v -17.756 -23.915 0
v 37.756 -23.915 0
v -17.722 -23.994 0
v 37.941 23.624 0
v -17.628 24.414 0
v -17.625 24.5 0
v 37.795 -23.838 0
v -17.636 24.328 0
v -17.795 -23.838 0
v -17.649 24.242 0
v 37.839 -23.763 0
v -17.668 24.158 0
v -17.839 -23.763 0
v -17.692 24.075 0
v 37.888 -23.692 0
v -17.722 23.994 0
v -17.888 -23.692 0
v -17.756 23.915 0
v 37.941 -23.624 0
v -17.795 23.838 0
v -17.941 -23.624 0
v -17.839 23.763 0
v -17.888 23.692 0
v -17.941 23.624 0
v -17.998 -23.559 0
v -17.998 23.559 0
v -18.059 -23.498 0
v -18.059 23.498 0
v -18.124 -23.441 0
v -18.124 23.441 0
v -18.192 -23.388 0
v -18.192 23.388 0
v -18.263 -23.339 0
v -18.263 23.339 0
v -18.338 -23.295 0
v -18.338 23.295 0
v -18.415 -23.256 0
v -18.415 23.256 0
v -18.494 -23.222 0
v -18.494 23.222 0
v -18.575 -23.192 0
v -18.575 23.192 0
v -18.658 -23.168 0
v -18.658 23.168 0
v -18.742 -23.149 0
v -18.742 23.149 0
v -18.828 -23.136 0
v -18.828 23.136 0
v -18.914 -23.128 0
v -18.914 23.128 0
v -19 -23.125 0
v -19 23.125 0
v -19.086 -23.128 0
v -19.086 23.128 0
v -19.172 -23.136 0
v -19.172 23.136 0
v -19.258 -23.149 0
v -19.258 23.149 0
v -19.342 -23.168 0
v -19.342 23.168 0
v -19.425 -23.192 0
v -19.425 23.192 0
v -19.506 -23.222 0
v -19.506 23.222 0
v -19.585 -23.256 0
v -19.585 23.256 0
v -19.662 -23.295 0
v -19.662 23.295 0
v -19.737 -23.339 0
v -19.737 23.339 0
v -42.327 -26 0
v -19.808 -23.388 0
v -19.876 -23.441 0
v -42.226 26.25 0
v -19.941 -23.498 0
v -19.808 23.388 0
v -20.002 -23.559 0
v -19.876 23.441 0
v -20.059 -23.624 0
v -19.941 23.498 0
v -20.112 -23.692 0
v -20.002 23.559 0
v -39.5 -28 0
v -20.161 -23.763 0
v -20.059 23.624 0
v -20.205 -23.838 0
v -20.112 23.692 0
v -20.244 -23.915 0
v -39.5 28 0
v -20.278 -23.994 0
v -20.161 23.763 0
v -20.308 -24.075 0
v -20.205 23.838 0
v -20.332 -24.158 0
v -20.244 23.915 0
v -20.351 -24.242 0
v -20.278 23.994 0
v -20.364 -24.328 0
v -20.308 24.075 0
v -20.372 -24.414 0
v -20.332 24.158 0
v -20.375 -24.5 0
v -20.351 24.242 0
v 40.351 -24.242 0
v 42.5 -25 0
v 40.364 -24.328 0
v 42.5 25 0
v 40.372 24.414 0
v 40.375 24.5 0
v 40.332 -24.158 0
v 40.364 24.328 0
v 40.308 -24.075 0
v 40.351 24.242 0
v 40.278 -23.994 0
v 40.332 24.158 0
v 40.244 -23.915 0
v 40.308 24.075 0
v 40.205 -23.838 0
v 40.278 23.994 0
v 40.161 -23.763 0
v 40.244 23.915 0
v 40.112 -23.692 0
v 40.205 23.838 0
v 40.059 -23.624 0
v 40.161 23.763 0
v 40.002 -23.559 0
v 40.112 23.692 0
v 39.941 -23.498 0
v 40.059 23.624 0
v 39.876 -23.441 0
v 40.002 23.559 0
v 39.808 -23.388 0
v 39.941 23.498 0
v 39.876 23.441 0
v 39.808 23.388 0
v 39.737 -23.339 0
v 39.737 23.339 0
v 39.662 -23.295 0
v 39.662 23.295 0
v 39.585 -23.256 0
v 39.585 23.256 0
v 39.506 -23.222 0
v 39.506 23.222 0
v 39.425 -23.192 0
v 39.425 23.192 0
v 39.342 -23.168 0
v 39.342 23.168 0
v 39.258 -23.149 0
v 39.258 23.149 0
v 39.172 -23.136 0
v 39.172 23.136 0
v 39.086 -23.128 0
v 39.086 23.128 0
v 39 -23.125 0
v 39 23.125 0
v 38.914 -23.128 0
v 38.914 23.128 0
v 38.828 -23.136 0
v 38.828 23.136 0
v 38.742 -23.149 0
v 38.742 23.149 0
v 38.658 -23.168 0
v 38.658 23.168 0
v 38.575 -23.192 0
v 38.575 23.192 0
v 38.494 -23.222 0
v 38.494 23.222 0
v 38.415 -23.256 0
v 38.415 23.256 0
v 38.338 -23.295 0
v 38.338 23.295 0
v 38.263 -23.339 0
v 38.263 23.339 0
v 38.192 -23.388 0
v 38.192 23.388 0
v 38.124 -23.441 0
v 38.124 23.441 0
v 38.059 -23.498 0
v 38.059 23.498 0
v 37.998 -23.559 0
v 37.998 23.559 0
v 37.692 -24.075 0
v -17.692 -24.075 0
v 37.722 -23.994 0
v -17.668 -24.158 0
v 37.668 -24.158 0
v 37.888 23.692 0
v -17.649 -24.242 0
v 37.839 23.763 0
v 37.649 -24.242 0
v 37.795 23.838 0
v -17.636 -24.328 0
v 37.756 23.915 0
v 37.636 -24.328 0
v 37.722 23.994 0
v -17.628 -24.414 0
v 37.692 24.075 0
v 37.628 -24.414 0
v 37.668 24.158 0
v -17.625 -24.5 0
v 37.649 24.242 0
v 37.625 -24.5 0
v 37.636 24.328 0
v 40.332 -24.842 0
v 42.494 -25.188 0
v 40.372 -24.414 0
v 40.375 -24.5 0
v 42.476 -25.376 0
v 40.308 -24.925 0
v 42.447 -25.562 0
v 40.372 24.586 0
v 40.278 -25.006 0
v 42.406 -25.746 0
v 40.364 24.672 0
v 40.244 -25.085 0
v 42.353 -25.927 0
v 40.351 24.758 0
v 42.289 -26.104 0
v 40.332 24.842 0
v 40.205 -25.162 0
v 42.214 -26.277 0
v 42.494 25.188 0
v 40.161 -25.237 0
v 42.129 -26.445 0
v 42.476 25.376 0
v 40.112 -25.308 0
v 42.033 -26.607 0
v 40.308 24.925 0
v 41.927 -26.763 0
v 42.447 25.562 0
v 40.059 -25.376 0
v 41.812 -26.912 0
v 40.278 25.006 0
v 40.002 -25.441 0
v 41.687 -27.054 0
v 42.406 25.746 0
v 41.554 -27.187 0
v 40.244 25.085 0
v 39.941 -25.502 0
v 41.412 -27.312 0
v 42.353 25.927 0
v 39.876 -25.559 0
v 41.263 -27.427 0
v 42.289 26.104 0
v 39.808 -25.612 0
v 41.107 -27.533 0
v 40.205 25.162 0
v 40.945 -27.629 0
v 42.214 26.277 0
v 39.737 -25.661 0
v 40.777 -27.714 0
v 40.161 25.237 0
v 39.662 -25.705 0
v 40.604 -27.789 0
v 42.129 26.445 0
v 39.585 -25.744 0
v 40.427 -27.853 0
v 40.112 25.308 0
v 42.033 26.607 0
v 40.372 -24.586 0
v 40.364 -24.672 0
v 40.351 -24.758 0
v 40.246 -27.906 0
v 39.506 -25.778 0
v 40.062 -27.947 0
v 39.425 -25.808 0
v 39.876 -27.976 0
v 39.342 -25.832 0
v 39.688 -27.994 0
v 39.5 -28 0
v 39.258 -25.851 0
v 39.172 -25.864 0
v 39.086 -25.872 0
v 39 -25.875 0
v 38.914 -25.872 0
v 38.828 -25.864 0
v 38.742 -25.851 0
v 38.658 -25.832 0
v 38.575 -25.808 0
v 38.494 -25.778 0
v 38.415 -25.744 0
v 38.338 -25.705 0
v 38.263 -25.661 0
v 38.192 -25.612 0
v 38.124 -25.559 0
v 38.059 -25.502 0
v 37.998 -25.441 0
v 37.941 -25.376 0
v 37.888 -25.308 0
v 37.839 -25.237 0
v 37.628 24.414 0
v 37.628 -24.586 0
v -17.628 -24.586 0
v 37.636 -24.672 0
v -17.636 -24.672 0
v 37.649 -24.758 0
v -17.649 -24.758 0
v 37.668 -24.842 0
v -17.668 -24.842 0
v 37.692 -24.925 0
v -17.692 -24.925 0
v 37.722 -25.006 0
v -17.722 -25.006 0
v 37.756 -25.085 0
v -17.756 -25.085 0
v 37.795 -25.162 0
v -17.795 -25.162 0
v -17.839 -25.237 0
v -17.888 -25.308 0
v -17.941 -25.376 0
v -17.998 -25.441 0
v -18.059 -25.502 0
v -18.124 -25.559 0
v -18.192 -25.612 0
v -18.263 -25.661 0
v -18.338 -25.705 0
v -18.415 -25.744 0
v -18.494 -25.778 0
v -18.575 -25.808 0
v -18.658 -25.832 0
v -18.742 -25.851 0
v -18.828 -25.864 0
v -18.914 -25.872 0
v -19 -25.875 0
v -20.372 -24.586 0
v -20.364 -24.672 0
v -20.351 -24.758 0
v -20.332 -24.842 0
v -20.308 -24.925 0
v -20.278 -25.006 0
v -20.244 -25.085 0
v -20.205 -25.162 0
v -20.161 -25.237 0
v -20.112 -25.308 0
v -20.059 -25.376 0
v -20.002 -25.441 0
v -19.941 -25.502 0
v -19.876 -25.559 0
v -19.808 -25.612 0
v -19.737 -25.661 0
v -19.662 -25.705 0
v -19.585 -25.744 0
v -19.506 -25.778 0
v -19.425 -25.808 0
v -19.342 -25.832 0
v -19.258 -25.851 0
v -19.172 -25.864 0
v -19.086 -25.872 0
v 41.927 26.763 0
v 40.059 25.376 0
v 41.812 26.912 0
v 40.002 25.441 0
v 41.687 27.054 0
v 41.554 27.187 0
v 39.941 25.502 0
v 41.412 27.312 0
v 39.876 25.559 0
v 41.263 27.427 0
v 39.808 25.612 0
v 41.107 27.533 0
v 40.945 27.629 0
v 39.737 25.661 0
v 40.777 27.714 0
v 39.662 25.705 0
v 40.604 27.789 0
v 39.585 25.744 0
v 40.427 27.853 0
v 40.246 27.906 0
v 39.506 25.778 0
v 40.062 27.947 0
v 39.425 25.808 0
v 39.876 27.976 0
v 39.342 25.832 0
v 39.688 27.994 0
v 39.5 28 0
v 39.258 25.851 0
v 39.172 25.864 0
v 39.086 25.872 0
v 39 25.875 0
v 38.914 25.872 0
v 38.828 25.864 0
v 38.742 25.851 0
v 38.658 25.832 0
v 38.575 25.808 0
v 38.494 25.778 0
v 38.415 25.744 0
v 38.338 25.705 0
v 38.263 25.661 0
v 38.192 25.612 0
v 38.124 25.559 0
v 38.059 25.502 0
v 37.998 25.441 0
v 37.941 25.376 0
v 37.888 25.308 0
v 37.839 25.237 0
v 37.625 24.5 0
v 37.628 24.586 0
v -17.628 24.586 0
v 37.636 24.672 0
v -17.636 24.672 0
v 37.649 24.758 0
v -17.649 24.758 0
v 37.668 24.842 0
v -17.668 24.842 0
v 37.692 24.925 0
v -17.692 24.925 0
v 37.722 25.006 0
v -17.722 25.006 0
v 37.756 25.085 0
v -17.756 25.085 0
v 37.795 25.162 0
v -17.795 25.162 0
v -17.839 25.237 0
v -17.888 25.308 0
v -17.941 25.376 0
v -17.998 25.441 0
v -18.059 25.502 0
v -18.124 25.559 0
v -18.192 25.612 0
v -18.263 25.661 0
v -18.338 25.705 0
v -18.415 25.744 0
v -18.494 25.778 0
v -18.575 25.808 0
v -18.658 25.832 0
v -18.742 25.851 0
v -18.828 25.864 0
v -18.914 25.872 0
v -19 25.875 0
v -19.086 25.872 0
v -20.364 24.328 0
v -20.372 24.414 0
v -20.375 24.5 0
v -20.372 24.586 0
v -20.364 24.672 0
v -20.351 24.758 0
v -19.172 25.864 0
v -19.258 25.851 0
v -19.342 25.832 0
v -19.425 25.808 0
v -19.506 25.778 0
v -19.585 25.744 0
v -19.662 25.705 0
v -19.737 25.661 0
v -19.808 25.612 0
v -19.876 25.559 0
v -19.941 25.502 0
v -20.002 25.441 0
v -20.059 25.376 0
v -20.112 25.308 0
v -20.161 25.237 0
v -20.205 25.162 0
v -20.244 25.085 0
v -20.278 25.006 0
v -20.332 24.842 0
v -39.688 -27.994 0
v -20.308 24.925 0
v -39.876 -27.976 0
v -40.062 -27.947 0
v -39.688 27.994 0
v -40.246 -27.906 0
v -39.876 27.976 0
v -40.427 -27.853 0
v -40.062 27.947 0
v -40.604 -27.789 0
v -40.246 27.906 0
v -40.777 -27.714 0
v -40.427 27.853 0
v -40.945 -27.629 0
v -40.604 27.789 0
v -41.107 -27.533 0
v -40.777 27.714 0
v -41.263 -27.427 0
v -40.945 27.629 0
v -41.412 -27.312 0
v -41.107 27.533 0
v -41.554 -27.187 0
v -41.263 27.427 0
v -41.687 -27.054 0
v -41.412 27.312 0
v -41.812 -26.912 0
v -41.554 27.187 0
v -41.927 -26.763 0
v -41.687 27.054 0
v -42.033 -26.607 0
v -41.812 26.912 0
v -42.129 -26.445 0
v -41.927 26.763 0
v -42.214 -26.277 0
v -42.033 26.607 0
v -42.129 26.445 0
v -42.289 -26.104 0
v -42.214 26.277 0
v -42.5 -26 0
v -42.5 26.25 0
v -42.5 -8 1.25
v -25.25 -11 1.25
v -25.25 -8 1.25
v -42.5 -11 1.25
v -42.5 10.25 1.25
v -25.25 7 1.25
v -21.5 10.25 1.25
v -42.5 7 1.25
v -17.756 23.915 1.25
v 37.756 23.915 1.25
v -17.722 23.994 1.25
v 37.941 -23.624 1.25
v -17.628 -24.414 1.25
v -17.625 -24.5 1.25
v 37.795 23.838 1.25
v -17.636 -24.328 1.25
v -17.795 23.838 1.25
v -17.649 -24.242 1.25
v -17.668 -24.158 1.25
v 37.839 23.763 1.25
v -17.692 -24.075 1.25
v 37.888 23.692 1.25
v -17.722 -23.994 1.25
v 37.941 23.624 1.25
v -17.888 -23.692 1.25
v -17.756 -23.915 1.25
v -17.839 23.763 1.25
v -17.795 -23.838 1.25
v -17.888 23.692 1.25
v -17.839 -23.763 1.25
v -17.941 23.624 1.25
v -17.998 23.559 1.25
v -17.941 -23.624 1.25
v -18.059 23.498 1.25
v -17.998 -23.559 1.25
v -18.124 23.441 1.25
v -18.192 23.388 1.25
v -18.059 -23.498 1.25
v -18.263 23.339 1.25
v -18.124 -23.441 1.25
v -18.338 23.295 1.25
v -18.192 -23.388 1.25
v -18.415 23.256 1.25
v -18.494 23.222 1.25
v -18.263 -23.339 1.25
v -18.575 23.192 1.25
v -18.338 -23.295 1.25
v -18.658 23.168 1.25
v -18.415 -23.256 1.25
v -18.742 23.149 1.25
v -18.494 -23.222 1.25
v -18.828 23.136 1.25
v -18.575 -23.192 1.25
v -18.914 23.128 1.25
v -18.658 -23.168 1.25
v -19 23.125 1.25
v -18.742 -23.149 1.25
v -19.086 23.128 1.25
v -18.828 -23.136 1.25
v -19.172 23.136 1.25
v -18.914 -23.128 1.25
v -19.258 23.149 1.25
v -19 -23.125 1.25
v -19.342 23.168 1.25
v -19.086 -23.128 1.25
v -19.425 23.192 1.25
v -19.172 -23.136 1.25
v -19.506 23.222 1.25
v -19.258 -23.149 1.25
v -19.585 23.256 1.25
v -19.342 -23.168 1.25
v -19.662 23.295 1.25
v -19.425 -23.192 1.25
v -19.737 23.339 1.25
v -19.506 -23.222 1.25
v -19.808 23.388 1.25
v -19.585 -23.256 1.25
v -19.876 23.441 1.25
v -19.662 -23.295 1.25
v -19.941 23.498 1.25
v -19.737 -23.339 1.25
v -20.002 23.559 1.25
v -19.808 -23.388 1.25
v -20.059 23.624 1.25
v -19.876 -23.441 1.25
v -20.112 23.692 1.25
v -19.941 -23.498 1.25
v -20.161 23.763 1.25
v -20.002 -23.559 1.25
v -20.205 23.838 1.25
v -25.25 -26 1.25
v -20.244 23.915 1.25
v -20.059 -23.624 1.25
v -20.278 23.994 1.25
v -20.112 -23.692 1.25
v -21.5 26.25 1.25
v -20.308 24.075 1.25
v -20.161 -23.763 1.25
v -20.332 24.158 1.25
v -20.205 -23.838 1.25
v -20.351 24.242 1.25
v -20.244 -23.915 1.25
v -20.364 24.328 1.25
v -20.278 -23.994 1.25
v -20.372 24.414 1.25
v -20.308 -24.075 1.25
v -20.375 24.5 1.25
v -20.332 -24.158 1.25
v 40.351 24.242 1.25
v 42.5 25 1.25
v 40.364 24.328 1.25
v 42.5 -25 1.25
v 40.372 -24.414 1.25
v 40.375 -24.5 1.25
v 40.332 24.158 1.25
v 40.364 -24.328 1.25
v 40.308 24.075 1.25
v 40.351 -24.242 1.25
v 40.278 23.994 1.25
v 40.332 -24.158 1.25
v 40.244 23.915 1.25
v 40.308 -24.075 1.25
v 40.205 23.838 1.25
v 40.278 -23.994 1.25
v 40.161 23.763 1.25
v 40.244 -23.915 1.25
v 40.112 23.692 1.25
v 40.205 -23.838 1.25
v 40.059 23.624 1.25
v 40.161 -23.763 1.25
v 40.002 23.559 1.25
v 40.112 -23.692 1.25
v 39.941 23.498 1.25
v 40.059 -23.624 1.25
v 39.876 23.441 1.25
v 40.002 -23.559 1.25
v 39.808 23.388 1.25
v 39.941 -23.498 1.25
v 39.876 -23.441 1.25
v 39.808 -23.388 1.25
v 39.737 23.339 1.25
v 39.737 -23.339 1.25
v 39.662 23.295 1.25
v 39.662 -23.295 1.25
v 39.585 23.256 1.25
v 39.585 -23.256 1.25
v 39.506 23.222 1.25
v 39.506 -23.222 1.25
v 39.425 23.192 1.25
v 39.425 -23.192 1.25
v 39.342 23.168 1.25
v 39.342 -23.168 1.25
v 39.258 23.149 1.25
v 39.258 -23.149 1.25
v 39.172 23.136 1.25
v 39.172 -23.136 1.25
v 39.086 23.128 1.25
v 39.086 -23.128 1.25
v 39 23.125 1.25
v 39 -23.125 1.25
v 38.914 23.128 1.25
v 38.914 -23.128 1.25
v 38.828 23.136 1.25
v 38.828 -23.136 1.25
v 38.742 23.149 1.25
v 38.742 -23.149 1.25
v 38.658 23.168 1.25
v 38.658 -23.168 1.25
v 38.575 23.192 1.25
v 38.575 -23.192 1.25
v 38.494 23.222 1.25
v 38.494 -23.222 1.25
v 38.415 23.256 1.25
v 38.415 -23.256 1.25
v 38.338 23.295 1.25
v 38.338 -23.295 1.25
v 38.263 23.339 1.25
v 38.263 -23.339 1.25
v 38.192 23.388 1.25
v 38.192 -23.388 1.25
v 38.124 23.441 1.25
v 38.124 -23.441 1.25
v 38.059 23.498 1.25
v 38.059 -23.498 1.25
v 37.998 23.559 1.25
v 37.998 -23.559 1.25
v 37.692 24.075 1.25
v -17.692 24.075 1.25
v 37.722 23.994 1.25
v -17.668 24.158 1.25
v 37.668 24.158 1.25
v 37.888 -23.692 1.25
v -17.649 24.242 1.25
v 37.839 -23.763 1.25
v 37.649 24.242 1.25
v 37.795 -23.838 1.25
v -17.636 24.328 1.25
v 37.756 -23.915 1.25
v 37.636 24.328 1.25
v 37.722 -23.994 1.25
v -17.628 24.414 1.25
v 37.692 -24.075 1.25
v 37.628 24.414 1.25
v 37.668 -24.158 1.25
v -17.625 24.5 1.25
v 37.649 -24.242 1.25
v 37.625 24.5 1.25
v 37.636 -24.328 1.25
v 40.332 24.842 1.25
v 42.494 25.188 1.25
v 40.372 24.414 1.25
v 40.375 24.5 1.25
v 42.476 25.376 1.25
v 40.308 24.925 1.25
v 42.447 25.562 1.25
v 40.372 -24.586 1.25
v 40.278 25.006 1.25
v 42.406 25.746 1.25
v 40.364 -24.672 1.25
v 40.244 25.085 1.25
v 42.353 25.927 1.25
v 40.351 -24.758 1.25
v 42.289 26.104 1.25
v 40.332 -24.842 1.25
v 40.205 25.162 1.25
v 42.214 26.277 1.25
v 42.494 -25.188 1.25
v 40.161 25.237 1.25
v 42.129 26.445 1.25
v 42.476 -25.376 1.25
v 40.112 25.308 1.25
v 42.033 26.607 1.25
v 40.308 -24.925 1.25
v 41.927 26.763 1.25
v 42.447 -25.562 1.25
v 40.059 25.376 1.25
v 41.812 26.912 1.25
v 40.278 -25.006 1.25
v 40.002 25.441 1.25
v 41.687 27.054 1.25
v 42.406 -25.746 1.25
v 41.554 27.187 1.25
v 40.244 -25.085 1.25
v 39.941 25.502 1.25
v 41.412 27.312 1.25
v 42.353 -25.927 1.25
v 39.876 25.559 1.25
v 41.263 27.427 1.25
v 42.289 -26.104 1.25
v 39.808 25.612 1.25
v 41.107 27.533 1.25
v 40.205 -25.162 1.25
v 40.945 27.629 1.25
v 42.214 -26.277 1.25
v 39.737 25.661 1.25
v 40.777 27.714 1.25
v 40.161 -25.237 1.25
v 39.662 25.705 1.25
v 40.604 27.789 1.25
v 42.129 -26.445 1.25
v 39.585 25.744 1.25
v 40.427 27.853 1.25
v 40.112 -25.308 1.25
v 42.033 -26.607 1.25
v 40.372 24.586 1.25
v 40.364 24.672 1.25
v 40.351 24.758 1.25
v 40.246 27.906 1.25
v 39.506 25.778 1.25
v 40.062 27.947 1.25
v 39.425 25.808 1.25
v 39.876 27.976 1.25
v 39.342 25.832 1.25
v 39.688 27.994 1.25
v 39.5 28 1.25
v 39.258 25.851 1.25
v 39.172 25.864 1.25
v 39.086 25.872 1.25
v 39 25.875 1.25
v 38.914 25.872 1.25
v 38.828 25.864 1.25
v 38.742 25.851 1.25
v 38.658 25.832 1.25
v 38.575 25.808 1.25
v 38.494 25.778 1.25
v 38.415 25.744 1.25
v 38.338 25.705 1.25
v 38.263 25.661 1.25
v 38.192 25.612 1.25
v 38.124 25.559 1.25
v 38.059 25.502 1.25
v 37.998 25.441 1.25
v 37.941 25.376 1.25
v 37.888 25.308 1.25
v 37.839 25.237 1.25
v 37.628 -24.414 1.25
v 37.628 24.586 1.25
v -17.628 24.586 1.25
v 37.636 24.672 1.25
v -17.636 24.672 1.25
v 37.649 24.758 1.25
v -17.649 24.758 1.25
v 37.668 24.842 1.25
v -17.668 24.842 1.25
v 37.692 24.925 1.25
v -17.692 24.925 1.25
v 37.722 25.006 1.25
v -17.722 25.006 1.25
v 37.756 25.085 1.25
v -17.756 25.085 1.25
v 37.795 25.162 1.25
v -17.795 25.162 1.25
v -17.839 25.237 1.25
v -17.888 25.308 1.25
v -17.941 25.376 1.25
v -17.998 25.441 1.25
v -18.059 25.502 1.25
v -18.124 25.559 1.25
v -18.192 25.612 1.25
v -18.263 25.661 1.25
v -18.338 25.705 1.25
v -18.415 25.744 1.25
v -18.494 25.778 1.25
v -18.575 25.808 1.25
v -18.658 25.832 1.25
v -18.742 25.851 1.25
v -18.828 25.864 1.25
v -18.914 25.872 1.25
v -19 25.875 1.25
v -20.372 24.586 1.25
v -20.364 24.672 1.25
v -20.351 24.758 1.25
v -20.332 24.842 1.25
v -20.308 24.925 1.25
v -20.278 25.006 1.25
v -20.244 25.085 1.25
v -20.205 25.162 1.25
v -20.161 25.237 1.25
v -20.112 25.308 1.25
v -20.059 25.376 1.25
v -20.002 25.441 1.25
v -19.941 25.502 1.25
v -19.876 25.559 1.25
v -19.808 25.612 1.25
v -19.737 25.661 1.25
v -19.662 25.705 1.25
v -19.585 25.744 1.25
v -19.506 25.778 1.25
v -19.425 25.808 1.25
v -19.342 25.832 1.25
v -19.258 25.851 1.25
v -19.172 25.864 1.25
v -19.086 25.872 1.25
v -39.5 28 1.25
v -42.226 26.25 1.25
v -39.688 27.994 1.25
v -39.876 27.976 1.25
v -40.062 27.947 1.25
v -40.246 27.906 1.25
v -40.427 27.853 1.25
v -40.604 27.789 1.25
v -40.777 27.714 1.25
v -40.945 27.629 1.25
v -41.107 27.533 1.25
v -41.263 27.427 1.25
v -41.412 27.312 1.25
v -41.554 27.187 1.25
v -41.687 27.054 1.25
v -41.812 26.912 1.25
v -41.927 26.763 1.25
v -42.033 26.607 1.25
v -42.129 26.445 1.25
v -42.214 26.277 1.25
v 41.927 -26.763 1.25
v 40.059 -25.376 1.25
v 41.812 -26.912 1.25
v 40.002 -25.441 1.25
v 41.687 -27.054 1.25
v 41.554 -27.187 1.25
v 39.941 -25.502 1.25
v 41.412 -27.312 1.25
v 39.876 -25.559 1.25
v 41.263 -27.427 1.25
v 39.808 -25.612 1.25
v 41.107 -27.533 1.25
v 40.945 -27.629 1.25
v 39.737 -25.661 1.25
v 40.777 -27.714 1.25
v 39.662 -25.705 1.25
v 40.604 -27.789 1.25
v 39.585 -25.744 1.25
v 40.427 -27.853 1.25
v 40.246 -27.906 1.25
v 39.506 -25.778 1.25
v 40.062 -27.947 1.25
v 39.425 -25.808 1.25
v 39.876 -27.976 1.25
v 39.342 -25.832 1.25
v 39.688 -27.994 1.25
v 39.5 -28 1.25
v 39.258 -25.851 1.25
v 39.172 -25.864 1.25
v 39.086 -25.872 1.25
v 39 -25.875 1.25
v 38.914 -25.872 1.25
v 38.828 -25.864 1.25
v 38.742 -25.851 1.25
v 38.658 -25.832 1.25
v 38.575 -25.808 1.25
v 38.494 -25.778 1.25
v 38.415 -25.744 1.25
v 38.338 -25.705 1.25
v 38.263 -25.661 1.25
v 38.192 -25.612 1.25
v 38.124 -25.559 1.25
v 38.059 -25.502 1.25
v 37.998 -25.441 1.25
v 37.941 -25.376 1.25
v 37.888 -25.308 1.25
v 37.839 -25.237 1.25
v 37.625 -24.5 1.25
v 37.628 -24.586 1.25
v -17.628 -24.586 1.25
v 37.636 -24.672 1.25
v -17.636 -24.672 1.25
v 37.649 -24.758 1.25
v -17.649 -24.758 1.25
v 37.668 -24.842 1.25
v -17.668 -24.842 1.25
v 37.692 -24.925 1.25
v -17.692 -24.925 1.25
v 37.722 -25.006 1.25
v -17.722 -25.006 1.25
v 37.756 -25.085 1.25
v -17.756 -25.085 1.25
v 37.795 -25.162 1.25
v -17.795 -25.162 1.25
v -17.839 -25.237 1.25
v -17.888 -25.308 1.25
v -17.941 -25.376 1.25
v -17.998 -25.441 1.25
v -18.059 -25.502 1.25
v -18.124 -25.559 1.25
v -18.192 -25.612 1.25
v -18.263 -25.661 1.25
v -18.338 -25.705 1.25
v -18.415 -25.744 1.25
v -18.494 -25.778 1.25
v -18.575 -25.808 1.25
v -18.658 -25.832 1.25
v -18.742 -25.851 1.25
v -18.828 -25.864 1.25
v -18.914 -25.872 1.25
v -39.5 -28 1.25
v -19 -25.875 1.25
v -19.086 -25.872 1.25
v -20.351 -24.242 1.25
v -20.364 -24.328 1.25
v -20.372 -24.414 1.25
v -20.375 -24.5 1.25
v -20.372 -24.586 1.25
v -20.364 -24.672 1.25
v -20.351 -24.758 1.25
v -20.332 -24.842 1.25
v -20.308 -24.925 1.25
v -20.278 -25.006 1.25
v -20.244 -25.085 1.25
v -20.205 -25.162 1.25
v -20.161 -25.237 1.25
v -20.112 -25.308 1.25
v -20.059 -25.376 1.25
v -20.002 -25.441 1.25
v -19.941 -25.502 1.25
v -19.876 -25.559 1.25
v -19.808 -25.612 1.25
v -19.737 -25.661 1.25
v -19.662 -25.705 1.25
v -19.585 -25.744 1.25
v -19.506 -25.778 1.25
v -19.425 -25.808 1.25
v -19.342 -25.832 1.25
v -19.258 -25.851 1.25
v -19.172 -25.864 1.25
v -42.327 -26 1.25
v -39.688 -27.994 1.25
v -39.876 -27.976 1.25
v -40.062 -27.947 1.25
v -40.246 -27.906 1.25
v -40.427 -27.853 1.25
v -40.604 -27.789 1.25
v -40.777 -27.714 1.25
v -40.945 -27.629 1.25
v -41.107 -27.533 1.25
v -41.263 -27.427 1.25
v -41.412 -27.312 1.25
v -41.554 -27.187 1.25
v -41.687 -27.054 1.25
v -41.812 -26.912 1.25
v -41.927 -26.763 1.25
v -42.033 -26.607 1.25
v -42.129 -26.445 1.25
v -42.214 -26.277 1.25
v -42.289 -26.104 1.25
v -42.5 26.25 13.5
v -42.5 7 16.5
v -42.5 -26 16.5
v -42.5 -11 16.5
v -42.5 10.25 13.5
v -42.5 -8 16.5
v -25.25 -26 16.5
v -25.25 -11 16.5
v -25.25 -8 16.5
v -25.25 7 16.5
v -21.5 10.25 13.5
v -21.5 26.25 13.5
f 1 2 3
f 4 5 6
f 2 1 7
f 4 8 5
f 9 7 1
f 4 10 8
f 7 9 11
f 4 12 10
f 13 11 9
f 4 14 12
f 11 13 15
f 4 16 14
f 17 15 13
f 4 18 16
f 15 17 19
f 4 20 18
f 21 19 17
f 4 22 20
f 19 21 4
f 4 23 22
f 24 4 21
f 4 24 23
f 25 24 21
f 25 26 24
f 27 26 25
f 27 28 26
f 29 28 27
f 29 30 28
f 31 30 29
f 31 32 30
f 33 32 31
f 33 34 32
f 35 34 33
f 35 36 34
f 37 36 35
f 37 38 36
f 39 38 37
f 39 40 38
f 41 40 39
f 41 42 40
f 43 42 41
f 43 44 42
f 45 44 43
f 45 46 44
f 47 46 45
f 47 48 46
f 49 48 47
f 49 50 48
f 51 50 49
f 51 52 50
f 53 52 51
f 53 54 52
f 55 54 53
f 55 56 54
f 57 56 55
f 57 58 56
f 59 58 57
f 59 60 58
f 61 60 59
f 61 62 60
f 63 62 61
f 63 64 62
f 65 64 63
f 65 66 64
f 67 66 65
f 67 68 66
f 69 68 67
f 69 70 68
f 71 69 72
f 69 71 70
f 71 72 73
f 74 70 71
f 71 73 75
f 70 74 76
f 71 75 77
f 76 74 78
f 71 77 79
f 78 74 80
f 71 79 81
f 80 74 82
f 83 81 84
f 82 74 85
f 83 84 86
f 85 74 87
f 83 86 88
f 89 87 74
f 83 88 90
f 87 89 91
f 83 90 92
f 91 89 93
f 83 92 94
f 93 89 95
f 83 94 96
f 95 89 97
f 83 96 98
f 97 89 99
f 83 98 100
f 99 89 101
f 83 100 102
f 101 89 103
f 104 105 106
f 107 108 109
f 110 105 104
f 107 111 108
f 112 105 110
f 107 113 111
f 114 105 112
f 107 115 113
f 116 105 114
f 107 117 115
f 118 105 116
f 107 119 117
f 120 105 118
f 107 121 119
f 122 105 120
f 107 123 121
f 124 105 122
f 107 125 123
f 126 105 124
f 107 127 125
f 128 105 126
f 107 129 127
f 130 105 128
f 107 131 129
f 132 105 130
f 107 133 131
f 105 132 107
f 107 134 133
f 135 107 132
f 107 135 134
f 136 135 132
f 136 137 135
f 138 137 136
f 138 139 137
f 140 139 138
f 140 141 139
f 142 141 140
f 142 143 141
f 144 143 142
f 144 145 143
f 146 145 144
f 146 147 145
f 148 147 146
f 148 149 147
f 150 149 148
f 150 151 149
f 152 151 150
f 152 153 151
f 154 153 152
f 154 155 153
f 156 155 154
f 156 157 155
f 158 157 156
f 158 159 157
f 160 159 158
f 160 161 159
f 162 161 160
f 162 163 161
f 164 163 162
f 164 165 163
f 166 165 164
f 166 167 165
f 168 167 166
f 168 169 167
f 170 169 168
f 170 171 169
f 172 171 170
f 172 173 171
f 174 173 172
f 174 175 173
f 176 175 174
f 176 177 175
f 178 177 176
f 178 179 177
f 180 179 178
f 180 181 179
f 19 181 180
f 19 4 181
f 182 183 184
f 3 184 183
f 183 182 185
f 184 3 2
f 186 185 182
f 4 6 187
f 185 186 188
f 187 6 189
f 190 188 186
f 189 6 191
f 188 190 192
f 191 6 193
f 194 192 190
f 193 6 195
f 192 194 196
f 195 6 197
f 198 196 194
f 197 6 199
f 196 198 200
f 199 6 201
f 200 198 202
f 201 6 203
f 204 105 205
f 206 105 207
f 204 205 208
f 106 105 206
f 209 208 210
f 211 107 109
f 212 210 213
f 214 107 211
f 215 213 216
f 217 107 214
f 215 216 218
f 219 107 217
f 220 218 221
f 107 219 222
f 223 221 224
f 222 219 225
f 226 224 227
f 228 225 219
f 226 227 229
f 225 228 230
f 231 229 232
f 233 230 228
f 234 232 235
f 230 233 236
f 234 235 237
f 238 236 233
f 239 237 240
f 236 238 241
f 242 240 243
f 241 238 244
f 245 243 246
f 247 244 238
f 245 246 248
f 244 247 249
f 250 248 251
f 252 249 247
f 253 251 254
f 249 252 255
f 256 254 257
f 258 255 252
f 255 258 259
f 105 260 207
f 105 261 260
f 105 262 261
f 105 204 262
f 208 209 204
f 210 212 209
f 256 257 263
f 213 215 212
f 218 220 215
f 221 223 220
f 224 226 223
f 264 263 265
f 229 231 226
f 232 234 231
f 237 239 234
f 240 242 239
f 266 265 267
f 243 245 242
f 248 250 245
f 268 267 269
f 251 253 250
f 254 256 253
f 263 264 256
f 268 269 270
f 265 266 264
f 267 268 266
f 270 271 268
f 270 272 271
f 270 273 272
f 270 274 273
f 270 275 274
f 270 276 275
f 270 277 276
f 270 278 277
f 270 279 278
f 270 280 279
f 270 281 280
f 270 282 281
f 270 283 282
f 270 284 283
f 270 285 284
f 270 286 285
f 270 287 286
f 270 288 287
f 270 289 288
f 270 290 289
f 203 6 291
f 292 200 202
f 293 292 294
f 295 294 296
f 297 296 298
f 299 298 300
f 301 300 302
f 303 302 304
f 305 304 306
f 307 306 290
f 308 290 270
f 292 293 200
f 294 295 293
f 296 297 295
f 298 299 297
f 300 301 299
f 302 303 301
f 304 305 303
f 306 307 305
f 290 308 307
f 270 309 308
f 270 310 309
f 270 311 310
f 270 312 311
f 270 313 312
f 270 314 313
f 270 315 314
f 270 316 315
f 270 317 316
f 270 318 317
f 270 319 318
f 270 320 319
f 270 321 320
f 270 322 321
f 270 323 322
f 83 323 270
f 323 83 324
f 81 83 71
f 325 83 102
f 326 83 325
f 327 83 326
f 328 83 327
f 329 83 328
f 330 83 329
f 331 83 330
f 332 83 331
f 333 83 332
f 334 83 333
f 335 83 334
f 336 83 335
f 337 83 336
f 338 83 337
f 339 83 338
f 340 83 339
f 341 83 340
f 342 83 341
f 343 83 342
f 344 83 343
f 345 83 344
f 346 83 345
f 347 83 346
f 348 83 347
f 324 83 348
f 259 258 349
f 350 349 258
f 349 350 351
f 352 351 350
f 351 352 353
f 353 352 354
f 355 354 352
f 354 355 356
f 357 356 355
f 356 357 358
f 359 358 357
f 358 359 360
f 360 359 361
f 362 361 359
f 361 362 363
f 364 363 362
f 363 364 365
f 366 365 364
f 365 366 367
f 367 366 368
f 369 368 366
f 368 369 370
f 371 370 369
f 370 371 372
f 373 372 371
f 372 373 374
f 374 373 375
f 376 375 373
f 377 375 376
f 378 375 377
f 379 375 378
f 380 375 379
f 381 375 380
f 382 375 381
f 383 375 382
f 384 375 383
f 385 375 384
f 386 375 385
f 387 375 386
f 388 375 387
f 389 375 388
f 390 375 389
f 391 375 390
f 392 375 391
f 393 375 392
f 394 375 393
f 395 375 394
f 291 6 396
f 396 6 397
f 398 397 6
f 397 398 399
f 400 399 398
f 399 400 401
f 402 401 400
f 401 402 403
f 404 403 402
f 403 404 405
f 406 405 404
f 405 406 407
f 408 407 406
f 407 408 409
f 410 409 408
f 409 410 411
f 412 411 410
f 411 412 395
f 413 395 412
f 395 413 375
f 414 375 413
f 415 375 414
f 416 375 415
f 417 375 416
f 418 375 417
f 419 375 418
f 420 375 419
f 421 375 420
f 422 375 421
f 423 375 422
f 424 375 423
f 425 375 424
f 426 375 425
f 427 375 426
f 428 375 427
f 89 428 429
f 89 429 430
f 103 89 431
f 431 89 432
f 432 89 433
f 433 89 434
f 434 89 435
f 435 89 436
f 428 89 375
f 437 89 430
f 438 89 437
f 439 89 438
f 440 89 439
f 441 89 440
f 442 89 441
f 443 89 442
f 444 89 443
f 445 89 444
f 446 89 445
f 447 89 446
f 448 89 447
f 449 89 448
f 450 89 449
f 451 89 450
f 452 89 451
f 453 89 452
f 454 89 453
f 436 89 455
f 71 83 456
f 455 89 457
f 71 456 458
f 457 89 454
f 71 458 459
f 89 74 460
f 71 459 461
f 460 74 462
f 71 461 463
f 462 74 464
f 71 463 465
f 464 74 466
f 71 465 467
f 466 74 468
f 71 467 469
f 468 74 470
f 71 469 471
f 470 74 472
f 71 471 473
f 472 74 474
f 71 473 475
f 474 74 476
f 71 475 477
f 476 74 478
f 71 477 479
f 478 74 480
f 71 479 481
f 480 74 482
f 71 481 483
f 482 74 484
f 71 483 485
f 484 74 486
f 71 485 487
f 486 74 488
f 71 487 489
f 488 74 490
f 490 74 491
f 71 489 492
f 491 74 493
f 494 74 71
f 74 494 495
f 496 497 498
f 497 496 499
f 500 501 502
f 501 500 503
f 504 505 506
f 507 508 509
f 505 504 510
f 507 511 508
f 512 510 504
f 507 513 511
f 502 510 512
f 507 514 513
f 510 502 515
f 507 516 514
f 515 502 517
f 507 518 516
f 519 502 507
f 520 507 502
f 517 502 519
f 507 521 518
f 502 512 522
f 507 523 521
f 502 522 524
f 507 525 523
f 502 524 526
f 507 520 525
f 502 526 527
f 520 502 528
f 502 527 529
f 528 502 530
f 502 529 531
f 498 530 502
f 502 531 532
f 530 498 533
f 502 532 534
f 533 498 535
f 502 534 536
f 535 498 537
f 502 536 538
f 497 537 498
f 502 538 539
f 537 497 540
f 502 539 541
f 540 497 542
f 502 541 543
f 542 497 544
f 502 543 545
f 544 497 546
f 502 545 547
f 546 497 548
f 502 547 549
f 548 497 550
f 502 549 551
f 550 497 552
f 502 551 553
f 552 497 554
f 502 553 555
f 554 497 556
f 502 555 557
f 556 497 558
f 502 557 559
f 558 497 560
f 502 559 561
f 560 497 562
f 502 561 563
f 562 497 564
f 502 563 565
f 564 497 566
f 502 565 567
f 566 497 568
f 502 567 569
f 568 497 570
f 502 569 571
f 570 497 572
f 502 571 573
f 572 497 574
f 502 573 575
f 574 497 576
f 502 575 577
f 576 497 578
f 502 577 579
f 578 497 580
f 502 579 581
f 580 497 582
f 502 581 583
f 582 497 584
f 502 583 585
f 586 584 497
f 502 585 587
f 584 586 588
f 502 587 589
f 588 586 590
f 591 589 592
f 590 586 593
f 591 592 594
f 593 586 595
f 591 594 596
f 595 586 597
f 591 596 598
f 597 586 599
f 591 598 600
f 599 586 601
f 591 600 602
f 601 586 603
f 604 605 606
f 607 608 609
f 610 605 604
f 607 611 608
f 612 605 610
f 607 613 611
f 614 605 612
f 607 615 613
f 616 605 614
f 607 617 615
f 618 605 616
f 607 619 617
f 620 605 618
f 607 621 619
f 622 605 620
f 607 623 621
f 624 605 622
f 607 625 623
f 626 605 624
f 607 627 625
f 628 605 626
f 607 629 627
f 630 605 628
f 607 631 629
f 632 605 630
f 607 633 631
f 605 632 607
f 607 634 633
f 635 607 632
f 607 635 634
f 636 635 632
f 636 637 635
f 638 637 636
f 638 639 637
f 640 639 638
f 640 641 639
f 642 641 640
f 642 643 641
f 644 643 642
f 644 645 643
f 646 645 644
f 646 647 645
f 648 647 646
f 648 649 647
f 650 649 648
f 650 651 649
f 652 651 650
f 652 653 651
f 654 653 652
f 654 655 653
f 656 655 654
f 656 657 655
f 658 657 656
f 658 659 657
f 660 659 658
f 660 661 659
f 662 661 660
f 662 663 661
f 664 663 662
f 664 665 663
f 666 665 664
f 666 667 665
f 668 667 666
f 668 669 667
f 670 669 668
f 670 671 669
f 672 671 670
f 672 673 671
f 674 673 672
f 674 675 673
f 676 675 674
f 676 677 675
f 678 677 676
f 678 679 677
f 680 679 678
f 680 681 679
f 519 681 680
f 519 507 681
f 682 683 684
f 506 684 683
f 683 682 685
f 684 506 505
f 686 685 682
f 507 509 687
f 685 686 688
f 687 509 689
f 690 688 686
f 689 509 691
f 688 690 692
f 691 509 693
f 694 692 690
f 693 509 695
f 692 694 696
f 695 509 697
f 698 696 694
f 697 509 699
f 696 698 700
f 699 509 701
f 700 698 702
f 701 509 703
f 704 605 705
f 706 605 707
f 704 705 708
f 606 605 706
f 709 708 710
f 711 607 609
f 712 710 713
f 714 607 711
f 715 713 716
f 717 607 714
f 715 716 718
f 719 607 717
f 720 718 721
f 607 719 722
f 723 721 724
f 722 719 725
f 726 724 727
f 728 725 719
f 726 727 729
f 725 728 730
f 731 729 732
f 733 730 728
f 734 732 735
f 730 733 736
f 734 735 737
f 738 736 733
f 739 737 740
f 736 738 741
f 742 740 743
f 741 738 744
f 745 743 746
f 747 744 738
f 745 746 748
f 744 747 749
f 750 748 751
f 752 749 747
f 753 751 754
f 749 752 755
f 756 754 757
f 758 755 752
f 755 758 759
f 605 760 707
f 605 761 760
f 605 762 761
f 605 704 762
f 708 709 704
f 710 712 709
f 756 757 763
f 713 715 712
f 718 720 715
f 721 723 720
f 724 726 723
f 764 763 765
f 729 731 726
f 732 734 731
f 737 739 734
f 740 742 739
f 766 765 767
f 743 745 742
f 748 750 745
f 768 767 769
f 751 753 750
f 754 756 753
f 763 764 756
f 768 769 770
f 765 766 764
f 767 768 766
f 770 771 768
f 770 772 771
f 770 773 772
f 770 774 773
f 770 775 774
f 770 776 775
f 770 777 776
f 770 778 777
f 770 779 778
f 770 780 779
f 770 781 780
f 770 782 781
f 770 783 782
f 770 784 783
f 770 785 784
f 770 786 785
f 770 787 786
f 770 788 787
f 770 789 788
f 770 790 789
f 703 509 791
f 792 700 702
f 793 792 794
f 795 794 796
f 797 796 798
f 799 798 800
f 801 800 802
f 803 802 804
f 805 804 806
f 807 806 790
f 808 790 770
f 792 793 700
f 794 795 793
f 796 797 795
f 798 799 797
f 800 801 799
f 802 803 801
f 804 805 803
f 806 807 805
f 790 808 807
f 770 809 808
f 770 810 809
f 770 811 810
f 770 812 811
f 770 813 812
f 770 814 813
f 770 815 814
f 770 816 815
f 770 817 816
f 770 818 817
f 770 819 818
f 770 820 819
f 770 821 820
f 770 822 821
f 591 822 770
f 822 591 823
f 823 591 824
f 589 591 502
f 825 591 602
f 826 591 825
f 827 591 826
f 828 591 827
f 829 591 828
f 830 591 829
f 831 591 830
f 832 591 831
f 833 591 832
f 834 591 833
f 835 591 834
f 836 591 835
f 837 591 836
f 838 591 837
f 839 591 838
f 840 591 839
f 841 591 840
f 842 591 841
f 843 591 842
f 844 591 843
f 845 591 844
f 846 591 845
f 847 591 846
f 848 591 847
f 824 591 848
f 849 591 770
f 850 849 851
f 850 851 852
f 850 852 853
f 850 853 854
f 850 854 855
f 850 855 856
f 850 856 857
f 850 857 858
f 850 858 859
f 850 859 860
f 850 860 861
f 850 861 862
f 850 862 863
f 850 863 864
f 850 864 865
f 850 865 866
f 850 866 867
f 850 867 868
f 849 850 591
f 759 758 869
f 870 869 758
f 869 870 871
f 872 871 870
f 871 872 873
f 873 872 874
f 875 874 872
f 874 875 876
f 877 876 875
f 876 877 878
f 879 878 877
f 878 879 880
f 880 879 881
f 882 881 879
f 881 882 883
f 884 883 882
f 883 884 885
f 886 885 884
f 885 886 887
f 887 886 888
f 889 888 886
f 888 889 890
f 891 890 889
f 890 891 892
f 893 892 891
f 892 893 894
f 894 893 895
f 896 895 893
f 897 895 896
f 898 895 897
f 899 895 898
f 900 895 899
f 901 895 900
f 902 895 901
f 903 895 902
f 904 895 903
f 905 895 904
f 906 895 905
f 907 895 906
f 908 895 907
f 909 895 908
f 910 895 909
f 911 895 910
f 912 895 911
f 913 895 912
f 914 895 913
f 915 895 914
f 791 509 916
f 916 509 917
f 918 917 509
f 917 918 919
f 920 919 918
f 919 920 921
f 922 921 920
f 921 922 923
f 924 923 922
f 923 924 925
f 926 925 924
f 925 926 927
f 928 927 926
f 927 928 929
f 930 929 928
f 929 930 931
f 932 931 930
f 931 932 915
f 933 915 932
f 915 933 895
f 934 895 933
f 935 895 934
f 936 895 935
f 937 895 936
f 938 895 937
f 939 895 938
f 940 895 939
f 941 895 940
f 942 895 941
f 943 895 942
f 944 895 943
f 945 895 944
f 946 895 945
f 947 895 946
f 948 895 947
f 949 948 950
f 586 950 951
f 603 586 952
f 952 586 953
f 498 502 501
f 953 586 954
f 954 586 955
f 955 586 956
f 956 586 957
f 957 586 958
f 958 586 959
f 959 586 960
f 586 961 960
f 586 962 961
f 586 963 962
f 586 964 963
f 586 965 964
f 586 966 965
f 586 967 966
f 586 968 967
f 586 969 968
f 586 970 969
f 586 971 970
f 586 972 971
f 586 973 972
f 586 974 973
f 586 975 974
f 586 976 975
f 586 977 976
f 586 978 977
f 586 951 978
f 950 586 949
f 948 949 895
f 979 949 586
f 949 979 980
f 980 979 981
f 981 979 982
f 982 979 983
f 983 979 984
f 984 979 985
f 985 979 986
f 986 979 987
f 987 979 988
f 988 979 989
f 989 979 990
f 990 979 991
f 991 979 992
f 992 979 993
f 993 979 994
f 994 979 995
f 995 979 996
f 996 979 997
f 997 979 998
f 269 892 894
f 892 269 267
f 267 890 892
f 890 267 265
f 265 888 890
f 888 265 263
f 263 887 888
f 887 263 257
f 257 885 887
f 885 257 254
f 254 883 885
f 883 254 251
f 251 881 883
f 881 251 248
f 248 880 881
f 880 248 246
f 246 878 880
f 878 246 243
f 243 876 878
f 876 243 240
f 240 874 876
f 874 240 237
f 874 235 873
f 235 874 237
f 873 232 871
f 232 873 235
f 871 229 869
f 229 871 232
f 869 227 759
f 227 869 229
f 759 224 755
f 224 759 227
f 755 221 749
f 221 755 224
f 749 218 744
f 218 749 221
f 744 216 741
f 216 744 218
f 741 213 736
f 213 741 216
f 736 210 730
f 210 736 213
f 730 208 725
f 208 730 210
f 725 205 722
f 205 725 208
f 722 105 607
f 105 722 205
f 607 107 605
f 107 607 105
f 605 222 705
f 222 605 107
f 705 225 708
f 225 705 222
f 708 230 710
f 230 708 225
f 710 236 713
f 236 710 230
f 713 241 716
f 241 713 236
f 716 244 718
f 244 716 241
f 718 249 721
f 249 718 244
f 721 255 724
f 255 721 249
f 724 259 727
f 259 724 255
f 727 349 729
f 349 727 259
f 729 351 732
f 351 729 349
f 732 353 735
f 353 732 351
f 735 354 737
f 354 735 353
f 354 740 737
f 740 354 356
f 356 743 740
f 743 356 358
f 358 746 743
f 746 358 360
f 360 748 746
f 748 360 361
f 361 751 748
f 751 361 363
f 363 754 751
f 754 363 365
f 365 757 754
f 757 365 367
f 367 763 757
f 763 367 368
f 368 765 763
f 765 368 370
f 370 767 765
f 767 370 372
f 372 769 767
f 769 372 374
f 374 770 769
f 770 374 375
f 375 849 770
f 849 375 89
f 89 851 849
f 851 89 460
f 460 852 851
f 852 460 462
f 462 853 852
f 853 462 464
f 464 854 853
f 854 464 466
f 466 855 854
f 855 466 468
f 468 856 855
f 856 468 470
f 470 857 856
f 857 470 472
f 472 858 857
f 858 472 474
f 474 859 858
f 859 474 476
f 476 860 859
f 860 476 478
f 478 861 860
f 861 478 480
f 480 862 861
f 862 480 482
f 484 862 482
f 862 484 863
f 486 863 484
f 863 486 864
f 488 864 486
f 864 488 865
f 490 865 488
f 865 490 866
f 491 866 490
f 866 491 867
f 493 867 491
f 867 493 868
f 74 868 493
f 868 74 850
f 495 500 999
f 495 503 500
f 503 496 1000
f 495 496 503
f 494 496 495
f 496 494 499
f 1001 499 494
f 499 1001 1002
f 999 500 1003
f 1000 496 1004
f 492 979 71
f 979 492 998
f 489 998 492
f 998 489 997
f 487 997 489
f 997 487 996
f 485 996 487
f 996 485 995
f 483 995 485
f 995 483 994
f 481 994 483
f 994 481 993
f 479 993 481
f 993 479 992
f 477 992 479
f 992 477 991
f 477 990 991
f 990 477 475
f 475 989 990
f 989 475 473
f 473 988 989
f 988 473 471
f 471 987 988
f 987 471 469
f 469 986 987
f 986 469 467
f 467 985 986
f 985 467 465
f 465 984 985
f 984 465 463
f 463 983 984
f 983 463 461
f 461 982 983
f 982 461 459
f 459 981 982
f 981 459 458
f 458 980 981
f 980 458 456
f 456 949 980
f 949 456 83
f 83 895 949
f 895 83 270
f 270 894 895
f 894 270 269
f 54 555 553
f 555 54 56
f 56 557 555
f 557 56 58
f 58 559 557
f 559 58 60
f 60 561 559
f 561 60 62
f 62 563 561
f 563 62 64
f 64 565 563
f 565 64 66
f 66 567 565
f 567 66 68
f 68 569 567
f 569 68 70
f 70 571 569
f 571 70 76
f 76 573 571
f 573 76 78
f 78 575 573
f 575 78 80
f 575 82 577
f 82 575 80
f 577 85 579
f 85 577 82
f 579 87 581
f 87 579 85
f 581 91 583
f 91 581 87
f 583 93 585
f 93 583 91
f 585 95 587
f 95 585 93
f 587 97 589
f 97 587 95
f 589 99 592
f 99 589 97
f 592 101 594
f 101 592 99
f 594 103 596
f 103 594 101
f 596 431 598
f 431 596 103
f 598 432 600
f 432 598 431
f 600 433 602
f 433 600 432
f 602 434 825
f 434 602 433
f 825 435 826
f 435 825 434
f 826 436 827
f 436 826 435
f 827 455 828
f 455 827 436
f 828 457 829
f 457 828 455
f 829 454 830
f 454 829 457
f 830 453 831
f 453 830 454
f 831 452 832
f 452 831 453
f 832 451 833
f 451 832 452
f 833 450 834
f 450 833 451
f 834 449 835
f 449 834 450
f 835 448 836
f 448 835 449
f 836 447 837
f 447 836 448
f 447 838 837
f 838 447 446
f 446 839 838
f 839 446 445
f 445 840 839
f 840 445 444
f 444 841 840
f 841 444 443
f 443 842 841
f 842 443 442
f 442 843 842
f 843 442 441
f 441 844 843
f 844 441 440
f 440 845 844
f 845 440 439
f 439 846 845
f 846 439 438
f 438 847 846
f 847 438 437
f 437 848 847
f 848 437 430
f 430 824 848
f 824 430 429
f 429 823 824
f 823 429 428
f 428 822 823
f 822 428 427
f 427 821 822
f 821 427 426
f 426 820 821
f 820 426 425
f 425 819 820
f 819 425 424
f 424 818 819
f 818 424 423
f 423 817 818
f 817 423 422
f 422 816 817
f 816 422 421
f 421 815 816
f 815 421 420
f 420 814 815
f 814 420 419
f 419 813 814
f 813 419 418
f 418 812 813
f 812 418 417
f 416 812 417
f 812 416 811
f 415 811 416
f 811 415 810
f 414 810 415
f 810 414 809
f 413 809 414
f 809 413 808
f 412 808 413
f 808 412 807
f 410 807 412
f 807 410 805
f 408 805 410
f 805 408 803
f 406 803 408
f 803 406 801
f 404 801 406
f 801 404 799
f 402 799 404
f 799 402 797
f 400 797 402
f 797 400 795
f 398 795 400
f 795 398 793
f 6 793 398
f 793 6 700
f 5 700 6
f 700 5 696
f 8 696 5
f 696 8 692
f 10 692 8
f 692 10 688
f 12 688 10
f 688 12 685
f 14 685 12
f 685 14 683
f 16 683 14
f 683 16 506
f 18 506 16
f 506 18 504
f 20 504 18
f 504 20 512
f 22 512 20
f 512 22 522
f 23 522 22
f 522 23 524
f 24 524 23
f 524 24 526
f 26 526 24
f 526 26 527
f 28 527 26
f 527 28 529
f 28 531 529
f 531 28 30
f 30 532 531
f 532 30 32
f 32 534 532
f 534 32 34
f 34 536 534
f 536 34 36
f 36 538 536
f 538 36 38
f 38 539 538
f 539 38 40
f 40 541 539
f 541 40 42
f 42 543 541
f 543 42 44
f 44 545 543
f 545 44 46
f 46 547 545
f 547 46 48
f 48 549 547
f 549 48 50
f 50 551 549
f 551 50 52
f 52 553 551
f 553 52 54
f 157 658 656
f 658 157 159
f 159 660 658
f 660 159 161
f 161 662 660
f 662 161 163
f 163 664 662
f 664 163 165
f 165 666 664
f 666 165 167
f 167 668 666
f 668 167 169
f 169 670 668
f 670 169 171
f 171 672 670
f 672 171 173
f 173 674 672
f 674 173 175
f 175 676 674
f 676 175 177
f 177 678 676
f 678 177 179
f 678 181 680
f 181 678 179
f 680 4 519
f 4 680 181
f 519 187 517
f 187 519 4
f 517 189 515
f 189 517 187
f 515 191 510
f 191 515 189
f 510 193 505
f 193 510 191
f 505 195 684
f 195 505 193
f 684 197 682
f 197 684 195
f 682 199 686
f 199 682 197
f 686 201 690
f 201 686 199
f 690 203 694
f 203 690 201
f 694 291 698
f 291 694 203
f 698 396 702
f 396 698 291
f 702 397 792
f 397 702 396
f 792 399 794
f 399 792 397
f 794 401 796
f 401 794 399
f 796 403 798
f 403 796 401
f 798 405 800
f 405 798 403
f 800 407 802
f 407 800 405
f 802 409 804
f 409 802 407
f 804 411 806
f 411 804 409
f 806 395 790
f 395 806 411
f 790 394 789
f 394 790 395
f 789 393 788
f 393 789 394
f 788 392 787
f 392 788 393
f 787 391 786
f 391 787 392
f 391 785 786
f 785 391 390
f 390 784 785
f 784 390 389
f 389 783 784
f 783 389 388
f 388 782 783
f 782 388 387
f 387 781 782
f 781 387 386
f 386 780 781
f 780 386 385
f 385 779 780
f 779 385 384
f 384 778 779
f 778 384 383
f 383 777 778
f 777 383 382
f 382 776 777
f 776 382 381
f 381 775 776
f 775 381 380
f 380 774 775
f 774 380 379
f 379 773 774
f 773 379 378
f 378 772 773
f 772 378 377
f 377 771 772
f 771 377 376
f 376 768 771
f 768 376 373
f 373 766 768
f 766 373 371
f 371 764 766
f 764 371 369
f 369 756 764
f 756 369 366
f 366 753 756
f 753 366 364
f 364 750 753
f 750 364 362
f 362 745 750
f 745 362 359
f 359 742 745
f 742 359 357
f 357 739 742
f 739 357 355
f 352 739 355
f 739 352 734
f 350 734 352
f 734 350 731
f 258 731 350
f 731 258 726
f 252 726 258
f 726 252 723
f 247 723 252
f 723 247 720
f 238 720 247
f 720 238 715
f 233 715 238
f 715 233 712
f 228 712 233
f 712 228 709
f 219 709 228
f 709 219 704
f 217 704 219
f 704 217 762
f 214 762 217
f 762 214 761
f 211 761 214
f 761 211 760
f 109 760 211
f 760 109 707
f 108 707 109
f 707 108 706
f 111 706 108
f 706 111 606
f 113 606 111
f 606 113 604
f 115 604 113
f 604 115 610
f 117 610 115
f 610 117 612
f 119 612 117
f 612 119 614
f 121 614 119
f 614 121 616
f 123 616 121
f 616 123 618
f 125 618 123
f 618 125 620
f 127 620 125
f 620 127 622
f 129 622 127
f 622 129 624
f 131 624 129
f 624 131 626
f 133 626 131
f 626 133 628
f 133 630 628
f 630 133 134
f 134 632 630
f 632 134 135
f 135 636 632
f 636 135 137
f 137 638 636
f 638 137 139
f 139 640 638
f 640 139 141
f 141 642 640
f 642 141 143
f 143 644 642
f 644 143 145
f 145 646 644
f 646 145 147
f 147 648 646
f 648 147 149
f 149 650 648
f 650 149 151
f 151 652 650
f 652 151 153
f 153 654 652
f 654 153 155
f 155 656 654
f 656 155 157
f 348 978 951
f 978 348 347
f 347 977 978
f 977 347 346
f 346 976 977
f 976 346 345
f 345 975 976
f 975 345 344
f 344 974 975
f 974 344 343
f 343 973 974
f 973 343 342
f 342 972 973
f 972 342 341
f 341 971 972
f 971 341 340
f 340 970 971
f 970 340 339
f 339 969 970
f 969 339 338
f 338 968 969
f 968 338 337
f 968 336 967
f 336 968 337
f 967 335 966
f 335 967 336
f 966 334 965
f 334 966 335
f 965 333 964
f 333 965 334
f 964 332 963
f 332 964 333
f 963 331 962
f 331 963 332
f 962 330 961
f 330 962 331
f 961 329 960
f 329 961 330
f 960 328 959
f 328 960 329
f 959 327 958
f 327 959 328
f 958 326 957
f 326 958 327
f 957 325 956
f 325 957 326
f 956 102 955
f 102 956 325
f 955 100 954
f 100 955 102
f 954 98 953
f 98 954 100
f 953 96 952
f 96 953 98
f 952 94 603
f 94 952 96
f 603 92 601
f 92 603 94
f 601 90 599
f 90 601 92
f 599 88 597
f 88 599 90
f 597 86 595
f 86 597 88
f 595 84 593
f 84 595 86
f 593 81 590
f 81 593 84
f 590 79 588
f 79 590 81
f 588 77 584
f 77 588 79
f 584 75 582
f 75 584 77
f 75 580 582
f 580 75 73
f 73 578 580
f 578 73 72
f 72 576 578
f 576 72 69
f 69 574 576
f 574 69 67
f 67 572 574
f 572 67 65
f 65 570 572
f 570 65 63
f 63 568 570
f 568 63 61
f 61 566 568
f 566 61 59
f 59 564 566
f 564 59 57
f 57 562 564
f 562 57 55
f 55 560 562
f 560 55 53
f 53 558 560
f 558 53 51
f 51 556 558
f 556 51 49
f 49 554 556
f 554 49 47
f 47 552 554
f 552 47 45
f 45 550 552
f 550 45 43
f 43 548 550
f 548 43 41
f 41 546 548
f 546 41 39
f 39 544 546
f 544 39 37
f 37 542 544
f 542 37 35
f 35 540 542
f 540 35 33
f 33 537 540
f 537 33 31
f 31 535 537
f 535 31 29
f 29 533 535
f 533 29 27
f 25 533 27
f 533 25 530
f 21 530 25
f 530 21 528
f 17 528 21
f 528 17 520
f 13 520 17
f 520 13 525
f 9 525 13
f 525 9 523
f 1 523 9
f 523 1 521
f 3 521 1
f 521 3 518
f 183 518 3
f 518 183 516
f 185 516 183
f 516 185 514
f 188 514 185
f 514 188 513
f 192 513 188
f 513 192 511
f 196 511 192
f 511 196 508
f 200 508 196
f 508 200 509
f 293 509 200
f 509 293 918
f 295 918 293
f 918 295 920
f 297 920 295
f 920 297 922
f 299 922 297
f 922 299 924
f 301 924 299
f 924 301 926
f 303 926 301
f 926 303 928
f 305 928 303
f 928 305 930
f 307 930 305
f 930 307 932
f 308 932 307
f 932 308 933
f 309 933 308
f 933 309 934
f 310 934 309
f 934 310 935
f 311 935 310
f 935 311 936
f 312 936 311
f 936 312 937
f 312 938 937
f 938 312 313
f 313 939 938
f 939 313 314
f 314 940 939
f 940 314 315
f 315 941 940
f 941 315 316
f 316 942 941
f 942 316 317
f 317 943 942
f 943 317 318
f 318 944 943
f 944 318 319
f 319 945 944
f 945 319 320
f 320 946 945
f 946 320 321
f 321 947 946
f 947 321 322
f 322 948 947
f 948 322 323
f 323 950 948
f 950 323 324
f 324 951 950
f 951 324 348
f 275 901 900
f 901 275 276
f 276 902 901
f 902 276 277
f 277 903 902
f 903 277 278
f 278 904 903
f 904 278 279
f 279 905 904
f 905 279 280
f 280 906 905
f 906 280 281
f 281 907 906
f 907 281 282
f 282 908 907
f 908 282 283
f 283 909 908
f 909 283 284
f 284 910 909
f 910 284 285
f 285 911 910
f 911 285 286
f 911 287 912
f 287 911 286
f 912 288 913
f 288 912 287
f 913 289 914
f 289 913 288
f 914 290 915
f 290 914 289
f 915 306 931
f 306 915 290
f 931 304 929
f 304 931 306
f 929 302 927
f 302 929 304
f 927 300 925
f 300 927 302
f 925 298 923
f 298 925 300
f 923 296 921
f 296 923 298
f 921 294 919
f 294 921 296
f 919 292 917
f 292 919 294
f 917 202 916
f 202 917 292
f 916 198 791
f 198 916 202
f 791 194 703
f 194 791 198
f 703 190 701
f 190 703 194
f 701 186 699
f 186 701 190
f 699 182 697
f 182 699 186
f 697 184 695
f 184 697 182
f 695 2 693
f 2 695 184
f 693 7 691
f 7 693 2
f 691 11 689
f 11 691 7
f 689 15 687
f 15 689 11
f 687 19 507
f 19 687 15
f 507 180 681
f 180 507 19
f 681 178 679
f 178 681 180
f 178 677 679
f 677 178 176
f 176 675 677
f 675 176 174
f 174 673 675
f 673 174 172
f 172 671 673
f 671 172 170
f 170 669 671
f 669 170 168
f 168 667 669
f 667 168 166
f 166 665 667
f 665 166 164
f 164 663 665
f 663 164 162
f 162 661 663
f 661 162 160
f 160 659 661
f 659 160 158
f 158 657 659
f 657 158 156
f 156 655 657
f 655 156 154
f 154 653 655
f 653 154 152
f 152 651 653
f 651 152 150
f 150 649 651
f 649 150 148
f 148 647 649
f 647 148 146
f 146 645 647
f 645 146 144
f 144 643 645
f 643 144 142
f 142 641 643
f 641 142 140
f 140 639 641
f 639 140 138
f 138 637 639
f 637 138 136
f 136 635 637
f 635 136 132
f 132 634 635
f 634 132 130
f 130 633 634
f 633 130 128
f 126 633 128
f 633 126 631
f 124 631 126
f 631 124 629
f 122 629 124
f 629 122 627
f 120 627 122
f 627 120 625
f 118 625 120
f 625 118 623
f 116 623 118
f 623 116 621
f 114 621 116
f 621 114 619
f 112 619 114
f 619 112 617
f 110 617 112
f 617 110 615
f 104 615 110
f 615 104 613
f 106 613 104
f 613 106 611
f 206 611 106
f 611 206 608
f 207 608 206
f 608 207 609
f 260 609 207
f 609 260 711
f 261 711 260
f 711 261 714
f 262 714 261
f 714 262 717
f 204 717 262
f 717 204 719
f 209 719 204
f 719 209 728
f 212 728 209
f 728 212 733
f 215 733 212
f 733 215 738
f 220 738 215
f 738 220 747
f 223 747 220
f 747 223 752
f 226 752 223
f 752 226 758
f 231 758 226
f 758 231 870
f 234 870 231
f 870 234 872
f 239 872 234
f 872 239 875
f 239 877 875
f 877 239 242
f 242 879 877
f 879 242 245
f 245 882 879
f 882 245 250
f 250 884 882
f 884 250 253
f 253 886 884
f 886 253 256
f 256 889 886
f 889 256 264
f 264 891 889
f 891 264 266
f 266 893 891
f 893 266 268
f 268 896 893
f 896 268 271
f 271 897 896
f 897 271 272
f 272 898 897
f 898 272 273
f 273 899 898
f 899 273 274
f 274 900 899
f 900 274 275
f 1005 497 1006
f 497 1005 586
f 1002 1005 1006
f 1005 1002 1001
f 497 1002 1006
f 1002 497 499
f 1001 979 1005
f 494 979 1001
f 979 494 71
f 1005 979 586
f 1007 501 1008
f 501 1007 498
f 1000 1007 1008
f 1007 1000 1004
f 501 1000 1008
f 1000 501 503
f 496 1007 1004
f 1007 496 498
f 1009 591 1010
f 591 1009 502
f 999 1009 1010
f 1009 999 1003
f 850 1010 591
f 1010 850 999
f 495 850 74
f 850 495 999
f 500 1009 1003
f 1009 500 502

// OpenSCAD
$fn=100;

//cylinder(d=20,h=15);
//translate([0,0,15]) cylinder(d=10, h=3);
//board_dim = [85, 56, 1.25];

/* Plate holes */
//hole_d = 2.75;
//hole_orig = [board_dim[0], board_dim[1]] * -.5;
//ring_off = 6.2 - hole_d;
//hole_pad = 3.5;
//holes_pos =  [[-39, -24.5], [19, -24.5], [-39, 24.5], [19, 24.5]];

/* Components bounding box dimensions */
ethernet_dim    = [   21, 16, 13.5];
gpio_dim        = [   51,  5,  8.5];
hdmi_dim        = [ 11.5, 15,  6.5];
jack_dim        = [ 14.5,  7,    6];
microsdcard_dim = [   15, 11,    1];
microsdslot_dim = [ 11.5, 12, 1.25];
microusb_dim    = [    6,  8,    3];
serialcon_dim   = [  2.5, 22,  5.5];

//ethusb_dim      = [17.25, 3.25, 13.5]; // cleanup box
//usbusb_dim      = [17.25,    3, 16.5]; // cleanup box
//

module rpi_board() {
    board_w=85;
    board_d=56;
    board_h=1.25;
    linear_extrude(board_h) {
        difference() {
            // board
            corner_radius=3;
            translate([corner_radius - board_w/2, corner_radius - board_d/2]) {
                minkowski() {
                    square([board_w - corner_radius*2, board_d - corner_radius*2]);
                    circle(r=corner_radius);
                }
            }
            // holes
            hole_d = 2.75;
            translate([-19,-24.5]) circle(d=hole_d);
            translate([-19, 24.5]) circle(d=hole_d);
            translate([39, -24.5]) circle(d=hole_d);
            translate([39, 24.5]) circle(d=hole_d);
        }
    }
    
    // usb
    usb_w=17.25;
    usb_d=15;
    usb_h=16.5;
    translate([-board_w/2,-board_d/2+2]) cube([usb_w,usb_d,usb_h]);
    translate([-board_w/2,-board_d/2+2+usb_d+3]) cube([usb_w,usb_d,usb_h]);
    
    // ethernet
    eth_w=21;
    eth_d=16;
    eth_h=13.5;
    translate([-board_w/2,-board_d/2+2+usb_d+3+usb_d+3.25]) cube([eth_w,eth_d,eth_h]);
     
}

rpi_board();

    

//difference() {
//plate_2d(board_dim[0], board_dim[1], 3);
//translate([-39,-24.5]) circle(hole_d);
//translate([19,-24.5]) circle(hole_d);
//translate([-39,24.5]) circle(hole_d);
//translate([19,24.5]) circle(hole_d);
//}
